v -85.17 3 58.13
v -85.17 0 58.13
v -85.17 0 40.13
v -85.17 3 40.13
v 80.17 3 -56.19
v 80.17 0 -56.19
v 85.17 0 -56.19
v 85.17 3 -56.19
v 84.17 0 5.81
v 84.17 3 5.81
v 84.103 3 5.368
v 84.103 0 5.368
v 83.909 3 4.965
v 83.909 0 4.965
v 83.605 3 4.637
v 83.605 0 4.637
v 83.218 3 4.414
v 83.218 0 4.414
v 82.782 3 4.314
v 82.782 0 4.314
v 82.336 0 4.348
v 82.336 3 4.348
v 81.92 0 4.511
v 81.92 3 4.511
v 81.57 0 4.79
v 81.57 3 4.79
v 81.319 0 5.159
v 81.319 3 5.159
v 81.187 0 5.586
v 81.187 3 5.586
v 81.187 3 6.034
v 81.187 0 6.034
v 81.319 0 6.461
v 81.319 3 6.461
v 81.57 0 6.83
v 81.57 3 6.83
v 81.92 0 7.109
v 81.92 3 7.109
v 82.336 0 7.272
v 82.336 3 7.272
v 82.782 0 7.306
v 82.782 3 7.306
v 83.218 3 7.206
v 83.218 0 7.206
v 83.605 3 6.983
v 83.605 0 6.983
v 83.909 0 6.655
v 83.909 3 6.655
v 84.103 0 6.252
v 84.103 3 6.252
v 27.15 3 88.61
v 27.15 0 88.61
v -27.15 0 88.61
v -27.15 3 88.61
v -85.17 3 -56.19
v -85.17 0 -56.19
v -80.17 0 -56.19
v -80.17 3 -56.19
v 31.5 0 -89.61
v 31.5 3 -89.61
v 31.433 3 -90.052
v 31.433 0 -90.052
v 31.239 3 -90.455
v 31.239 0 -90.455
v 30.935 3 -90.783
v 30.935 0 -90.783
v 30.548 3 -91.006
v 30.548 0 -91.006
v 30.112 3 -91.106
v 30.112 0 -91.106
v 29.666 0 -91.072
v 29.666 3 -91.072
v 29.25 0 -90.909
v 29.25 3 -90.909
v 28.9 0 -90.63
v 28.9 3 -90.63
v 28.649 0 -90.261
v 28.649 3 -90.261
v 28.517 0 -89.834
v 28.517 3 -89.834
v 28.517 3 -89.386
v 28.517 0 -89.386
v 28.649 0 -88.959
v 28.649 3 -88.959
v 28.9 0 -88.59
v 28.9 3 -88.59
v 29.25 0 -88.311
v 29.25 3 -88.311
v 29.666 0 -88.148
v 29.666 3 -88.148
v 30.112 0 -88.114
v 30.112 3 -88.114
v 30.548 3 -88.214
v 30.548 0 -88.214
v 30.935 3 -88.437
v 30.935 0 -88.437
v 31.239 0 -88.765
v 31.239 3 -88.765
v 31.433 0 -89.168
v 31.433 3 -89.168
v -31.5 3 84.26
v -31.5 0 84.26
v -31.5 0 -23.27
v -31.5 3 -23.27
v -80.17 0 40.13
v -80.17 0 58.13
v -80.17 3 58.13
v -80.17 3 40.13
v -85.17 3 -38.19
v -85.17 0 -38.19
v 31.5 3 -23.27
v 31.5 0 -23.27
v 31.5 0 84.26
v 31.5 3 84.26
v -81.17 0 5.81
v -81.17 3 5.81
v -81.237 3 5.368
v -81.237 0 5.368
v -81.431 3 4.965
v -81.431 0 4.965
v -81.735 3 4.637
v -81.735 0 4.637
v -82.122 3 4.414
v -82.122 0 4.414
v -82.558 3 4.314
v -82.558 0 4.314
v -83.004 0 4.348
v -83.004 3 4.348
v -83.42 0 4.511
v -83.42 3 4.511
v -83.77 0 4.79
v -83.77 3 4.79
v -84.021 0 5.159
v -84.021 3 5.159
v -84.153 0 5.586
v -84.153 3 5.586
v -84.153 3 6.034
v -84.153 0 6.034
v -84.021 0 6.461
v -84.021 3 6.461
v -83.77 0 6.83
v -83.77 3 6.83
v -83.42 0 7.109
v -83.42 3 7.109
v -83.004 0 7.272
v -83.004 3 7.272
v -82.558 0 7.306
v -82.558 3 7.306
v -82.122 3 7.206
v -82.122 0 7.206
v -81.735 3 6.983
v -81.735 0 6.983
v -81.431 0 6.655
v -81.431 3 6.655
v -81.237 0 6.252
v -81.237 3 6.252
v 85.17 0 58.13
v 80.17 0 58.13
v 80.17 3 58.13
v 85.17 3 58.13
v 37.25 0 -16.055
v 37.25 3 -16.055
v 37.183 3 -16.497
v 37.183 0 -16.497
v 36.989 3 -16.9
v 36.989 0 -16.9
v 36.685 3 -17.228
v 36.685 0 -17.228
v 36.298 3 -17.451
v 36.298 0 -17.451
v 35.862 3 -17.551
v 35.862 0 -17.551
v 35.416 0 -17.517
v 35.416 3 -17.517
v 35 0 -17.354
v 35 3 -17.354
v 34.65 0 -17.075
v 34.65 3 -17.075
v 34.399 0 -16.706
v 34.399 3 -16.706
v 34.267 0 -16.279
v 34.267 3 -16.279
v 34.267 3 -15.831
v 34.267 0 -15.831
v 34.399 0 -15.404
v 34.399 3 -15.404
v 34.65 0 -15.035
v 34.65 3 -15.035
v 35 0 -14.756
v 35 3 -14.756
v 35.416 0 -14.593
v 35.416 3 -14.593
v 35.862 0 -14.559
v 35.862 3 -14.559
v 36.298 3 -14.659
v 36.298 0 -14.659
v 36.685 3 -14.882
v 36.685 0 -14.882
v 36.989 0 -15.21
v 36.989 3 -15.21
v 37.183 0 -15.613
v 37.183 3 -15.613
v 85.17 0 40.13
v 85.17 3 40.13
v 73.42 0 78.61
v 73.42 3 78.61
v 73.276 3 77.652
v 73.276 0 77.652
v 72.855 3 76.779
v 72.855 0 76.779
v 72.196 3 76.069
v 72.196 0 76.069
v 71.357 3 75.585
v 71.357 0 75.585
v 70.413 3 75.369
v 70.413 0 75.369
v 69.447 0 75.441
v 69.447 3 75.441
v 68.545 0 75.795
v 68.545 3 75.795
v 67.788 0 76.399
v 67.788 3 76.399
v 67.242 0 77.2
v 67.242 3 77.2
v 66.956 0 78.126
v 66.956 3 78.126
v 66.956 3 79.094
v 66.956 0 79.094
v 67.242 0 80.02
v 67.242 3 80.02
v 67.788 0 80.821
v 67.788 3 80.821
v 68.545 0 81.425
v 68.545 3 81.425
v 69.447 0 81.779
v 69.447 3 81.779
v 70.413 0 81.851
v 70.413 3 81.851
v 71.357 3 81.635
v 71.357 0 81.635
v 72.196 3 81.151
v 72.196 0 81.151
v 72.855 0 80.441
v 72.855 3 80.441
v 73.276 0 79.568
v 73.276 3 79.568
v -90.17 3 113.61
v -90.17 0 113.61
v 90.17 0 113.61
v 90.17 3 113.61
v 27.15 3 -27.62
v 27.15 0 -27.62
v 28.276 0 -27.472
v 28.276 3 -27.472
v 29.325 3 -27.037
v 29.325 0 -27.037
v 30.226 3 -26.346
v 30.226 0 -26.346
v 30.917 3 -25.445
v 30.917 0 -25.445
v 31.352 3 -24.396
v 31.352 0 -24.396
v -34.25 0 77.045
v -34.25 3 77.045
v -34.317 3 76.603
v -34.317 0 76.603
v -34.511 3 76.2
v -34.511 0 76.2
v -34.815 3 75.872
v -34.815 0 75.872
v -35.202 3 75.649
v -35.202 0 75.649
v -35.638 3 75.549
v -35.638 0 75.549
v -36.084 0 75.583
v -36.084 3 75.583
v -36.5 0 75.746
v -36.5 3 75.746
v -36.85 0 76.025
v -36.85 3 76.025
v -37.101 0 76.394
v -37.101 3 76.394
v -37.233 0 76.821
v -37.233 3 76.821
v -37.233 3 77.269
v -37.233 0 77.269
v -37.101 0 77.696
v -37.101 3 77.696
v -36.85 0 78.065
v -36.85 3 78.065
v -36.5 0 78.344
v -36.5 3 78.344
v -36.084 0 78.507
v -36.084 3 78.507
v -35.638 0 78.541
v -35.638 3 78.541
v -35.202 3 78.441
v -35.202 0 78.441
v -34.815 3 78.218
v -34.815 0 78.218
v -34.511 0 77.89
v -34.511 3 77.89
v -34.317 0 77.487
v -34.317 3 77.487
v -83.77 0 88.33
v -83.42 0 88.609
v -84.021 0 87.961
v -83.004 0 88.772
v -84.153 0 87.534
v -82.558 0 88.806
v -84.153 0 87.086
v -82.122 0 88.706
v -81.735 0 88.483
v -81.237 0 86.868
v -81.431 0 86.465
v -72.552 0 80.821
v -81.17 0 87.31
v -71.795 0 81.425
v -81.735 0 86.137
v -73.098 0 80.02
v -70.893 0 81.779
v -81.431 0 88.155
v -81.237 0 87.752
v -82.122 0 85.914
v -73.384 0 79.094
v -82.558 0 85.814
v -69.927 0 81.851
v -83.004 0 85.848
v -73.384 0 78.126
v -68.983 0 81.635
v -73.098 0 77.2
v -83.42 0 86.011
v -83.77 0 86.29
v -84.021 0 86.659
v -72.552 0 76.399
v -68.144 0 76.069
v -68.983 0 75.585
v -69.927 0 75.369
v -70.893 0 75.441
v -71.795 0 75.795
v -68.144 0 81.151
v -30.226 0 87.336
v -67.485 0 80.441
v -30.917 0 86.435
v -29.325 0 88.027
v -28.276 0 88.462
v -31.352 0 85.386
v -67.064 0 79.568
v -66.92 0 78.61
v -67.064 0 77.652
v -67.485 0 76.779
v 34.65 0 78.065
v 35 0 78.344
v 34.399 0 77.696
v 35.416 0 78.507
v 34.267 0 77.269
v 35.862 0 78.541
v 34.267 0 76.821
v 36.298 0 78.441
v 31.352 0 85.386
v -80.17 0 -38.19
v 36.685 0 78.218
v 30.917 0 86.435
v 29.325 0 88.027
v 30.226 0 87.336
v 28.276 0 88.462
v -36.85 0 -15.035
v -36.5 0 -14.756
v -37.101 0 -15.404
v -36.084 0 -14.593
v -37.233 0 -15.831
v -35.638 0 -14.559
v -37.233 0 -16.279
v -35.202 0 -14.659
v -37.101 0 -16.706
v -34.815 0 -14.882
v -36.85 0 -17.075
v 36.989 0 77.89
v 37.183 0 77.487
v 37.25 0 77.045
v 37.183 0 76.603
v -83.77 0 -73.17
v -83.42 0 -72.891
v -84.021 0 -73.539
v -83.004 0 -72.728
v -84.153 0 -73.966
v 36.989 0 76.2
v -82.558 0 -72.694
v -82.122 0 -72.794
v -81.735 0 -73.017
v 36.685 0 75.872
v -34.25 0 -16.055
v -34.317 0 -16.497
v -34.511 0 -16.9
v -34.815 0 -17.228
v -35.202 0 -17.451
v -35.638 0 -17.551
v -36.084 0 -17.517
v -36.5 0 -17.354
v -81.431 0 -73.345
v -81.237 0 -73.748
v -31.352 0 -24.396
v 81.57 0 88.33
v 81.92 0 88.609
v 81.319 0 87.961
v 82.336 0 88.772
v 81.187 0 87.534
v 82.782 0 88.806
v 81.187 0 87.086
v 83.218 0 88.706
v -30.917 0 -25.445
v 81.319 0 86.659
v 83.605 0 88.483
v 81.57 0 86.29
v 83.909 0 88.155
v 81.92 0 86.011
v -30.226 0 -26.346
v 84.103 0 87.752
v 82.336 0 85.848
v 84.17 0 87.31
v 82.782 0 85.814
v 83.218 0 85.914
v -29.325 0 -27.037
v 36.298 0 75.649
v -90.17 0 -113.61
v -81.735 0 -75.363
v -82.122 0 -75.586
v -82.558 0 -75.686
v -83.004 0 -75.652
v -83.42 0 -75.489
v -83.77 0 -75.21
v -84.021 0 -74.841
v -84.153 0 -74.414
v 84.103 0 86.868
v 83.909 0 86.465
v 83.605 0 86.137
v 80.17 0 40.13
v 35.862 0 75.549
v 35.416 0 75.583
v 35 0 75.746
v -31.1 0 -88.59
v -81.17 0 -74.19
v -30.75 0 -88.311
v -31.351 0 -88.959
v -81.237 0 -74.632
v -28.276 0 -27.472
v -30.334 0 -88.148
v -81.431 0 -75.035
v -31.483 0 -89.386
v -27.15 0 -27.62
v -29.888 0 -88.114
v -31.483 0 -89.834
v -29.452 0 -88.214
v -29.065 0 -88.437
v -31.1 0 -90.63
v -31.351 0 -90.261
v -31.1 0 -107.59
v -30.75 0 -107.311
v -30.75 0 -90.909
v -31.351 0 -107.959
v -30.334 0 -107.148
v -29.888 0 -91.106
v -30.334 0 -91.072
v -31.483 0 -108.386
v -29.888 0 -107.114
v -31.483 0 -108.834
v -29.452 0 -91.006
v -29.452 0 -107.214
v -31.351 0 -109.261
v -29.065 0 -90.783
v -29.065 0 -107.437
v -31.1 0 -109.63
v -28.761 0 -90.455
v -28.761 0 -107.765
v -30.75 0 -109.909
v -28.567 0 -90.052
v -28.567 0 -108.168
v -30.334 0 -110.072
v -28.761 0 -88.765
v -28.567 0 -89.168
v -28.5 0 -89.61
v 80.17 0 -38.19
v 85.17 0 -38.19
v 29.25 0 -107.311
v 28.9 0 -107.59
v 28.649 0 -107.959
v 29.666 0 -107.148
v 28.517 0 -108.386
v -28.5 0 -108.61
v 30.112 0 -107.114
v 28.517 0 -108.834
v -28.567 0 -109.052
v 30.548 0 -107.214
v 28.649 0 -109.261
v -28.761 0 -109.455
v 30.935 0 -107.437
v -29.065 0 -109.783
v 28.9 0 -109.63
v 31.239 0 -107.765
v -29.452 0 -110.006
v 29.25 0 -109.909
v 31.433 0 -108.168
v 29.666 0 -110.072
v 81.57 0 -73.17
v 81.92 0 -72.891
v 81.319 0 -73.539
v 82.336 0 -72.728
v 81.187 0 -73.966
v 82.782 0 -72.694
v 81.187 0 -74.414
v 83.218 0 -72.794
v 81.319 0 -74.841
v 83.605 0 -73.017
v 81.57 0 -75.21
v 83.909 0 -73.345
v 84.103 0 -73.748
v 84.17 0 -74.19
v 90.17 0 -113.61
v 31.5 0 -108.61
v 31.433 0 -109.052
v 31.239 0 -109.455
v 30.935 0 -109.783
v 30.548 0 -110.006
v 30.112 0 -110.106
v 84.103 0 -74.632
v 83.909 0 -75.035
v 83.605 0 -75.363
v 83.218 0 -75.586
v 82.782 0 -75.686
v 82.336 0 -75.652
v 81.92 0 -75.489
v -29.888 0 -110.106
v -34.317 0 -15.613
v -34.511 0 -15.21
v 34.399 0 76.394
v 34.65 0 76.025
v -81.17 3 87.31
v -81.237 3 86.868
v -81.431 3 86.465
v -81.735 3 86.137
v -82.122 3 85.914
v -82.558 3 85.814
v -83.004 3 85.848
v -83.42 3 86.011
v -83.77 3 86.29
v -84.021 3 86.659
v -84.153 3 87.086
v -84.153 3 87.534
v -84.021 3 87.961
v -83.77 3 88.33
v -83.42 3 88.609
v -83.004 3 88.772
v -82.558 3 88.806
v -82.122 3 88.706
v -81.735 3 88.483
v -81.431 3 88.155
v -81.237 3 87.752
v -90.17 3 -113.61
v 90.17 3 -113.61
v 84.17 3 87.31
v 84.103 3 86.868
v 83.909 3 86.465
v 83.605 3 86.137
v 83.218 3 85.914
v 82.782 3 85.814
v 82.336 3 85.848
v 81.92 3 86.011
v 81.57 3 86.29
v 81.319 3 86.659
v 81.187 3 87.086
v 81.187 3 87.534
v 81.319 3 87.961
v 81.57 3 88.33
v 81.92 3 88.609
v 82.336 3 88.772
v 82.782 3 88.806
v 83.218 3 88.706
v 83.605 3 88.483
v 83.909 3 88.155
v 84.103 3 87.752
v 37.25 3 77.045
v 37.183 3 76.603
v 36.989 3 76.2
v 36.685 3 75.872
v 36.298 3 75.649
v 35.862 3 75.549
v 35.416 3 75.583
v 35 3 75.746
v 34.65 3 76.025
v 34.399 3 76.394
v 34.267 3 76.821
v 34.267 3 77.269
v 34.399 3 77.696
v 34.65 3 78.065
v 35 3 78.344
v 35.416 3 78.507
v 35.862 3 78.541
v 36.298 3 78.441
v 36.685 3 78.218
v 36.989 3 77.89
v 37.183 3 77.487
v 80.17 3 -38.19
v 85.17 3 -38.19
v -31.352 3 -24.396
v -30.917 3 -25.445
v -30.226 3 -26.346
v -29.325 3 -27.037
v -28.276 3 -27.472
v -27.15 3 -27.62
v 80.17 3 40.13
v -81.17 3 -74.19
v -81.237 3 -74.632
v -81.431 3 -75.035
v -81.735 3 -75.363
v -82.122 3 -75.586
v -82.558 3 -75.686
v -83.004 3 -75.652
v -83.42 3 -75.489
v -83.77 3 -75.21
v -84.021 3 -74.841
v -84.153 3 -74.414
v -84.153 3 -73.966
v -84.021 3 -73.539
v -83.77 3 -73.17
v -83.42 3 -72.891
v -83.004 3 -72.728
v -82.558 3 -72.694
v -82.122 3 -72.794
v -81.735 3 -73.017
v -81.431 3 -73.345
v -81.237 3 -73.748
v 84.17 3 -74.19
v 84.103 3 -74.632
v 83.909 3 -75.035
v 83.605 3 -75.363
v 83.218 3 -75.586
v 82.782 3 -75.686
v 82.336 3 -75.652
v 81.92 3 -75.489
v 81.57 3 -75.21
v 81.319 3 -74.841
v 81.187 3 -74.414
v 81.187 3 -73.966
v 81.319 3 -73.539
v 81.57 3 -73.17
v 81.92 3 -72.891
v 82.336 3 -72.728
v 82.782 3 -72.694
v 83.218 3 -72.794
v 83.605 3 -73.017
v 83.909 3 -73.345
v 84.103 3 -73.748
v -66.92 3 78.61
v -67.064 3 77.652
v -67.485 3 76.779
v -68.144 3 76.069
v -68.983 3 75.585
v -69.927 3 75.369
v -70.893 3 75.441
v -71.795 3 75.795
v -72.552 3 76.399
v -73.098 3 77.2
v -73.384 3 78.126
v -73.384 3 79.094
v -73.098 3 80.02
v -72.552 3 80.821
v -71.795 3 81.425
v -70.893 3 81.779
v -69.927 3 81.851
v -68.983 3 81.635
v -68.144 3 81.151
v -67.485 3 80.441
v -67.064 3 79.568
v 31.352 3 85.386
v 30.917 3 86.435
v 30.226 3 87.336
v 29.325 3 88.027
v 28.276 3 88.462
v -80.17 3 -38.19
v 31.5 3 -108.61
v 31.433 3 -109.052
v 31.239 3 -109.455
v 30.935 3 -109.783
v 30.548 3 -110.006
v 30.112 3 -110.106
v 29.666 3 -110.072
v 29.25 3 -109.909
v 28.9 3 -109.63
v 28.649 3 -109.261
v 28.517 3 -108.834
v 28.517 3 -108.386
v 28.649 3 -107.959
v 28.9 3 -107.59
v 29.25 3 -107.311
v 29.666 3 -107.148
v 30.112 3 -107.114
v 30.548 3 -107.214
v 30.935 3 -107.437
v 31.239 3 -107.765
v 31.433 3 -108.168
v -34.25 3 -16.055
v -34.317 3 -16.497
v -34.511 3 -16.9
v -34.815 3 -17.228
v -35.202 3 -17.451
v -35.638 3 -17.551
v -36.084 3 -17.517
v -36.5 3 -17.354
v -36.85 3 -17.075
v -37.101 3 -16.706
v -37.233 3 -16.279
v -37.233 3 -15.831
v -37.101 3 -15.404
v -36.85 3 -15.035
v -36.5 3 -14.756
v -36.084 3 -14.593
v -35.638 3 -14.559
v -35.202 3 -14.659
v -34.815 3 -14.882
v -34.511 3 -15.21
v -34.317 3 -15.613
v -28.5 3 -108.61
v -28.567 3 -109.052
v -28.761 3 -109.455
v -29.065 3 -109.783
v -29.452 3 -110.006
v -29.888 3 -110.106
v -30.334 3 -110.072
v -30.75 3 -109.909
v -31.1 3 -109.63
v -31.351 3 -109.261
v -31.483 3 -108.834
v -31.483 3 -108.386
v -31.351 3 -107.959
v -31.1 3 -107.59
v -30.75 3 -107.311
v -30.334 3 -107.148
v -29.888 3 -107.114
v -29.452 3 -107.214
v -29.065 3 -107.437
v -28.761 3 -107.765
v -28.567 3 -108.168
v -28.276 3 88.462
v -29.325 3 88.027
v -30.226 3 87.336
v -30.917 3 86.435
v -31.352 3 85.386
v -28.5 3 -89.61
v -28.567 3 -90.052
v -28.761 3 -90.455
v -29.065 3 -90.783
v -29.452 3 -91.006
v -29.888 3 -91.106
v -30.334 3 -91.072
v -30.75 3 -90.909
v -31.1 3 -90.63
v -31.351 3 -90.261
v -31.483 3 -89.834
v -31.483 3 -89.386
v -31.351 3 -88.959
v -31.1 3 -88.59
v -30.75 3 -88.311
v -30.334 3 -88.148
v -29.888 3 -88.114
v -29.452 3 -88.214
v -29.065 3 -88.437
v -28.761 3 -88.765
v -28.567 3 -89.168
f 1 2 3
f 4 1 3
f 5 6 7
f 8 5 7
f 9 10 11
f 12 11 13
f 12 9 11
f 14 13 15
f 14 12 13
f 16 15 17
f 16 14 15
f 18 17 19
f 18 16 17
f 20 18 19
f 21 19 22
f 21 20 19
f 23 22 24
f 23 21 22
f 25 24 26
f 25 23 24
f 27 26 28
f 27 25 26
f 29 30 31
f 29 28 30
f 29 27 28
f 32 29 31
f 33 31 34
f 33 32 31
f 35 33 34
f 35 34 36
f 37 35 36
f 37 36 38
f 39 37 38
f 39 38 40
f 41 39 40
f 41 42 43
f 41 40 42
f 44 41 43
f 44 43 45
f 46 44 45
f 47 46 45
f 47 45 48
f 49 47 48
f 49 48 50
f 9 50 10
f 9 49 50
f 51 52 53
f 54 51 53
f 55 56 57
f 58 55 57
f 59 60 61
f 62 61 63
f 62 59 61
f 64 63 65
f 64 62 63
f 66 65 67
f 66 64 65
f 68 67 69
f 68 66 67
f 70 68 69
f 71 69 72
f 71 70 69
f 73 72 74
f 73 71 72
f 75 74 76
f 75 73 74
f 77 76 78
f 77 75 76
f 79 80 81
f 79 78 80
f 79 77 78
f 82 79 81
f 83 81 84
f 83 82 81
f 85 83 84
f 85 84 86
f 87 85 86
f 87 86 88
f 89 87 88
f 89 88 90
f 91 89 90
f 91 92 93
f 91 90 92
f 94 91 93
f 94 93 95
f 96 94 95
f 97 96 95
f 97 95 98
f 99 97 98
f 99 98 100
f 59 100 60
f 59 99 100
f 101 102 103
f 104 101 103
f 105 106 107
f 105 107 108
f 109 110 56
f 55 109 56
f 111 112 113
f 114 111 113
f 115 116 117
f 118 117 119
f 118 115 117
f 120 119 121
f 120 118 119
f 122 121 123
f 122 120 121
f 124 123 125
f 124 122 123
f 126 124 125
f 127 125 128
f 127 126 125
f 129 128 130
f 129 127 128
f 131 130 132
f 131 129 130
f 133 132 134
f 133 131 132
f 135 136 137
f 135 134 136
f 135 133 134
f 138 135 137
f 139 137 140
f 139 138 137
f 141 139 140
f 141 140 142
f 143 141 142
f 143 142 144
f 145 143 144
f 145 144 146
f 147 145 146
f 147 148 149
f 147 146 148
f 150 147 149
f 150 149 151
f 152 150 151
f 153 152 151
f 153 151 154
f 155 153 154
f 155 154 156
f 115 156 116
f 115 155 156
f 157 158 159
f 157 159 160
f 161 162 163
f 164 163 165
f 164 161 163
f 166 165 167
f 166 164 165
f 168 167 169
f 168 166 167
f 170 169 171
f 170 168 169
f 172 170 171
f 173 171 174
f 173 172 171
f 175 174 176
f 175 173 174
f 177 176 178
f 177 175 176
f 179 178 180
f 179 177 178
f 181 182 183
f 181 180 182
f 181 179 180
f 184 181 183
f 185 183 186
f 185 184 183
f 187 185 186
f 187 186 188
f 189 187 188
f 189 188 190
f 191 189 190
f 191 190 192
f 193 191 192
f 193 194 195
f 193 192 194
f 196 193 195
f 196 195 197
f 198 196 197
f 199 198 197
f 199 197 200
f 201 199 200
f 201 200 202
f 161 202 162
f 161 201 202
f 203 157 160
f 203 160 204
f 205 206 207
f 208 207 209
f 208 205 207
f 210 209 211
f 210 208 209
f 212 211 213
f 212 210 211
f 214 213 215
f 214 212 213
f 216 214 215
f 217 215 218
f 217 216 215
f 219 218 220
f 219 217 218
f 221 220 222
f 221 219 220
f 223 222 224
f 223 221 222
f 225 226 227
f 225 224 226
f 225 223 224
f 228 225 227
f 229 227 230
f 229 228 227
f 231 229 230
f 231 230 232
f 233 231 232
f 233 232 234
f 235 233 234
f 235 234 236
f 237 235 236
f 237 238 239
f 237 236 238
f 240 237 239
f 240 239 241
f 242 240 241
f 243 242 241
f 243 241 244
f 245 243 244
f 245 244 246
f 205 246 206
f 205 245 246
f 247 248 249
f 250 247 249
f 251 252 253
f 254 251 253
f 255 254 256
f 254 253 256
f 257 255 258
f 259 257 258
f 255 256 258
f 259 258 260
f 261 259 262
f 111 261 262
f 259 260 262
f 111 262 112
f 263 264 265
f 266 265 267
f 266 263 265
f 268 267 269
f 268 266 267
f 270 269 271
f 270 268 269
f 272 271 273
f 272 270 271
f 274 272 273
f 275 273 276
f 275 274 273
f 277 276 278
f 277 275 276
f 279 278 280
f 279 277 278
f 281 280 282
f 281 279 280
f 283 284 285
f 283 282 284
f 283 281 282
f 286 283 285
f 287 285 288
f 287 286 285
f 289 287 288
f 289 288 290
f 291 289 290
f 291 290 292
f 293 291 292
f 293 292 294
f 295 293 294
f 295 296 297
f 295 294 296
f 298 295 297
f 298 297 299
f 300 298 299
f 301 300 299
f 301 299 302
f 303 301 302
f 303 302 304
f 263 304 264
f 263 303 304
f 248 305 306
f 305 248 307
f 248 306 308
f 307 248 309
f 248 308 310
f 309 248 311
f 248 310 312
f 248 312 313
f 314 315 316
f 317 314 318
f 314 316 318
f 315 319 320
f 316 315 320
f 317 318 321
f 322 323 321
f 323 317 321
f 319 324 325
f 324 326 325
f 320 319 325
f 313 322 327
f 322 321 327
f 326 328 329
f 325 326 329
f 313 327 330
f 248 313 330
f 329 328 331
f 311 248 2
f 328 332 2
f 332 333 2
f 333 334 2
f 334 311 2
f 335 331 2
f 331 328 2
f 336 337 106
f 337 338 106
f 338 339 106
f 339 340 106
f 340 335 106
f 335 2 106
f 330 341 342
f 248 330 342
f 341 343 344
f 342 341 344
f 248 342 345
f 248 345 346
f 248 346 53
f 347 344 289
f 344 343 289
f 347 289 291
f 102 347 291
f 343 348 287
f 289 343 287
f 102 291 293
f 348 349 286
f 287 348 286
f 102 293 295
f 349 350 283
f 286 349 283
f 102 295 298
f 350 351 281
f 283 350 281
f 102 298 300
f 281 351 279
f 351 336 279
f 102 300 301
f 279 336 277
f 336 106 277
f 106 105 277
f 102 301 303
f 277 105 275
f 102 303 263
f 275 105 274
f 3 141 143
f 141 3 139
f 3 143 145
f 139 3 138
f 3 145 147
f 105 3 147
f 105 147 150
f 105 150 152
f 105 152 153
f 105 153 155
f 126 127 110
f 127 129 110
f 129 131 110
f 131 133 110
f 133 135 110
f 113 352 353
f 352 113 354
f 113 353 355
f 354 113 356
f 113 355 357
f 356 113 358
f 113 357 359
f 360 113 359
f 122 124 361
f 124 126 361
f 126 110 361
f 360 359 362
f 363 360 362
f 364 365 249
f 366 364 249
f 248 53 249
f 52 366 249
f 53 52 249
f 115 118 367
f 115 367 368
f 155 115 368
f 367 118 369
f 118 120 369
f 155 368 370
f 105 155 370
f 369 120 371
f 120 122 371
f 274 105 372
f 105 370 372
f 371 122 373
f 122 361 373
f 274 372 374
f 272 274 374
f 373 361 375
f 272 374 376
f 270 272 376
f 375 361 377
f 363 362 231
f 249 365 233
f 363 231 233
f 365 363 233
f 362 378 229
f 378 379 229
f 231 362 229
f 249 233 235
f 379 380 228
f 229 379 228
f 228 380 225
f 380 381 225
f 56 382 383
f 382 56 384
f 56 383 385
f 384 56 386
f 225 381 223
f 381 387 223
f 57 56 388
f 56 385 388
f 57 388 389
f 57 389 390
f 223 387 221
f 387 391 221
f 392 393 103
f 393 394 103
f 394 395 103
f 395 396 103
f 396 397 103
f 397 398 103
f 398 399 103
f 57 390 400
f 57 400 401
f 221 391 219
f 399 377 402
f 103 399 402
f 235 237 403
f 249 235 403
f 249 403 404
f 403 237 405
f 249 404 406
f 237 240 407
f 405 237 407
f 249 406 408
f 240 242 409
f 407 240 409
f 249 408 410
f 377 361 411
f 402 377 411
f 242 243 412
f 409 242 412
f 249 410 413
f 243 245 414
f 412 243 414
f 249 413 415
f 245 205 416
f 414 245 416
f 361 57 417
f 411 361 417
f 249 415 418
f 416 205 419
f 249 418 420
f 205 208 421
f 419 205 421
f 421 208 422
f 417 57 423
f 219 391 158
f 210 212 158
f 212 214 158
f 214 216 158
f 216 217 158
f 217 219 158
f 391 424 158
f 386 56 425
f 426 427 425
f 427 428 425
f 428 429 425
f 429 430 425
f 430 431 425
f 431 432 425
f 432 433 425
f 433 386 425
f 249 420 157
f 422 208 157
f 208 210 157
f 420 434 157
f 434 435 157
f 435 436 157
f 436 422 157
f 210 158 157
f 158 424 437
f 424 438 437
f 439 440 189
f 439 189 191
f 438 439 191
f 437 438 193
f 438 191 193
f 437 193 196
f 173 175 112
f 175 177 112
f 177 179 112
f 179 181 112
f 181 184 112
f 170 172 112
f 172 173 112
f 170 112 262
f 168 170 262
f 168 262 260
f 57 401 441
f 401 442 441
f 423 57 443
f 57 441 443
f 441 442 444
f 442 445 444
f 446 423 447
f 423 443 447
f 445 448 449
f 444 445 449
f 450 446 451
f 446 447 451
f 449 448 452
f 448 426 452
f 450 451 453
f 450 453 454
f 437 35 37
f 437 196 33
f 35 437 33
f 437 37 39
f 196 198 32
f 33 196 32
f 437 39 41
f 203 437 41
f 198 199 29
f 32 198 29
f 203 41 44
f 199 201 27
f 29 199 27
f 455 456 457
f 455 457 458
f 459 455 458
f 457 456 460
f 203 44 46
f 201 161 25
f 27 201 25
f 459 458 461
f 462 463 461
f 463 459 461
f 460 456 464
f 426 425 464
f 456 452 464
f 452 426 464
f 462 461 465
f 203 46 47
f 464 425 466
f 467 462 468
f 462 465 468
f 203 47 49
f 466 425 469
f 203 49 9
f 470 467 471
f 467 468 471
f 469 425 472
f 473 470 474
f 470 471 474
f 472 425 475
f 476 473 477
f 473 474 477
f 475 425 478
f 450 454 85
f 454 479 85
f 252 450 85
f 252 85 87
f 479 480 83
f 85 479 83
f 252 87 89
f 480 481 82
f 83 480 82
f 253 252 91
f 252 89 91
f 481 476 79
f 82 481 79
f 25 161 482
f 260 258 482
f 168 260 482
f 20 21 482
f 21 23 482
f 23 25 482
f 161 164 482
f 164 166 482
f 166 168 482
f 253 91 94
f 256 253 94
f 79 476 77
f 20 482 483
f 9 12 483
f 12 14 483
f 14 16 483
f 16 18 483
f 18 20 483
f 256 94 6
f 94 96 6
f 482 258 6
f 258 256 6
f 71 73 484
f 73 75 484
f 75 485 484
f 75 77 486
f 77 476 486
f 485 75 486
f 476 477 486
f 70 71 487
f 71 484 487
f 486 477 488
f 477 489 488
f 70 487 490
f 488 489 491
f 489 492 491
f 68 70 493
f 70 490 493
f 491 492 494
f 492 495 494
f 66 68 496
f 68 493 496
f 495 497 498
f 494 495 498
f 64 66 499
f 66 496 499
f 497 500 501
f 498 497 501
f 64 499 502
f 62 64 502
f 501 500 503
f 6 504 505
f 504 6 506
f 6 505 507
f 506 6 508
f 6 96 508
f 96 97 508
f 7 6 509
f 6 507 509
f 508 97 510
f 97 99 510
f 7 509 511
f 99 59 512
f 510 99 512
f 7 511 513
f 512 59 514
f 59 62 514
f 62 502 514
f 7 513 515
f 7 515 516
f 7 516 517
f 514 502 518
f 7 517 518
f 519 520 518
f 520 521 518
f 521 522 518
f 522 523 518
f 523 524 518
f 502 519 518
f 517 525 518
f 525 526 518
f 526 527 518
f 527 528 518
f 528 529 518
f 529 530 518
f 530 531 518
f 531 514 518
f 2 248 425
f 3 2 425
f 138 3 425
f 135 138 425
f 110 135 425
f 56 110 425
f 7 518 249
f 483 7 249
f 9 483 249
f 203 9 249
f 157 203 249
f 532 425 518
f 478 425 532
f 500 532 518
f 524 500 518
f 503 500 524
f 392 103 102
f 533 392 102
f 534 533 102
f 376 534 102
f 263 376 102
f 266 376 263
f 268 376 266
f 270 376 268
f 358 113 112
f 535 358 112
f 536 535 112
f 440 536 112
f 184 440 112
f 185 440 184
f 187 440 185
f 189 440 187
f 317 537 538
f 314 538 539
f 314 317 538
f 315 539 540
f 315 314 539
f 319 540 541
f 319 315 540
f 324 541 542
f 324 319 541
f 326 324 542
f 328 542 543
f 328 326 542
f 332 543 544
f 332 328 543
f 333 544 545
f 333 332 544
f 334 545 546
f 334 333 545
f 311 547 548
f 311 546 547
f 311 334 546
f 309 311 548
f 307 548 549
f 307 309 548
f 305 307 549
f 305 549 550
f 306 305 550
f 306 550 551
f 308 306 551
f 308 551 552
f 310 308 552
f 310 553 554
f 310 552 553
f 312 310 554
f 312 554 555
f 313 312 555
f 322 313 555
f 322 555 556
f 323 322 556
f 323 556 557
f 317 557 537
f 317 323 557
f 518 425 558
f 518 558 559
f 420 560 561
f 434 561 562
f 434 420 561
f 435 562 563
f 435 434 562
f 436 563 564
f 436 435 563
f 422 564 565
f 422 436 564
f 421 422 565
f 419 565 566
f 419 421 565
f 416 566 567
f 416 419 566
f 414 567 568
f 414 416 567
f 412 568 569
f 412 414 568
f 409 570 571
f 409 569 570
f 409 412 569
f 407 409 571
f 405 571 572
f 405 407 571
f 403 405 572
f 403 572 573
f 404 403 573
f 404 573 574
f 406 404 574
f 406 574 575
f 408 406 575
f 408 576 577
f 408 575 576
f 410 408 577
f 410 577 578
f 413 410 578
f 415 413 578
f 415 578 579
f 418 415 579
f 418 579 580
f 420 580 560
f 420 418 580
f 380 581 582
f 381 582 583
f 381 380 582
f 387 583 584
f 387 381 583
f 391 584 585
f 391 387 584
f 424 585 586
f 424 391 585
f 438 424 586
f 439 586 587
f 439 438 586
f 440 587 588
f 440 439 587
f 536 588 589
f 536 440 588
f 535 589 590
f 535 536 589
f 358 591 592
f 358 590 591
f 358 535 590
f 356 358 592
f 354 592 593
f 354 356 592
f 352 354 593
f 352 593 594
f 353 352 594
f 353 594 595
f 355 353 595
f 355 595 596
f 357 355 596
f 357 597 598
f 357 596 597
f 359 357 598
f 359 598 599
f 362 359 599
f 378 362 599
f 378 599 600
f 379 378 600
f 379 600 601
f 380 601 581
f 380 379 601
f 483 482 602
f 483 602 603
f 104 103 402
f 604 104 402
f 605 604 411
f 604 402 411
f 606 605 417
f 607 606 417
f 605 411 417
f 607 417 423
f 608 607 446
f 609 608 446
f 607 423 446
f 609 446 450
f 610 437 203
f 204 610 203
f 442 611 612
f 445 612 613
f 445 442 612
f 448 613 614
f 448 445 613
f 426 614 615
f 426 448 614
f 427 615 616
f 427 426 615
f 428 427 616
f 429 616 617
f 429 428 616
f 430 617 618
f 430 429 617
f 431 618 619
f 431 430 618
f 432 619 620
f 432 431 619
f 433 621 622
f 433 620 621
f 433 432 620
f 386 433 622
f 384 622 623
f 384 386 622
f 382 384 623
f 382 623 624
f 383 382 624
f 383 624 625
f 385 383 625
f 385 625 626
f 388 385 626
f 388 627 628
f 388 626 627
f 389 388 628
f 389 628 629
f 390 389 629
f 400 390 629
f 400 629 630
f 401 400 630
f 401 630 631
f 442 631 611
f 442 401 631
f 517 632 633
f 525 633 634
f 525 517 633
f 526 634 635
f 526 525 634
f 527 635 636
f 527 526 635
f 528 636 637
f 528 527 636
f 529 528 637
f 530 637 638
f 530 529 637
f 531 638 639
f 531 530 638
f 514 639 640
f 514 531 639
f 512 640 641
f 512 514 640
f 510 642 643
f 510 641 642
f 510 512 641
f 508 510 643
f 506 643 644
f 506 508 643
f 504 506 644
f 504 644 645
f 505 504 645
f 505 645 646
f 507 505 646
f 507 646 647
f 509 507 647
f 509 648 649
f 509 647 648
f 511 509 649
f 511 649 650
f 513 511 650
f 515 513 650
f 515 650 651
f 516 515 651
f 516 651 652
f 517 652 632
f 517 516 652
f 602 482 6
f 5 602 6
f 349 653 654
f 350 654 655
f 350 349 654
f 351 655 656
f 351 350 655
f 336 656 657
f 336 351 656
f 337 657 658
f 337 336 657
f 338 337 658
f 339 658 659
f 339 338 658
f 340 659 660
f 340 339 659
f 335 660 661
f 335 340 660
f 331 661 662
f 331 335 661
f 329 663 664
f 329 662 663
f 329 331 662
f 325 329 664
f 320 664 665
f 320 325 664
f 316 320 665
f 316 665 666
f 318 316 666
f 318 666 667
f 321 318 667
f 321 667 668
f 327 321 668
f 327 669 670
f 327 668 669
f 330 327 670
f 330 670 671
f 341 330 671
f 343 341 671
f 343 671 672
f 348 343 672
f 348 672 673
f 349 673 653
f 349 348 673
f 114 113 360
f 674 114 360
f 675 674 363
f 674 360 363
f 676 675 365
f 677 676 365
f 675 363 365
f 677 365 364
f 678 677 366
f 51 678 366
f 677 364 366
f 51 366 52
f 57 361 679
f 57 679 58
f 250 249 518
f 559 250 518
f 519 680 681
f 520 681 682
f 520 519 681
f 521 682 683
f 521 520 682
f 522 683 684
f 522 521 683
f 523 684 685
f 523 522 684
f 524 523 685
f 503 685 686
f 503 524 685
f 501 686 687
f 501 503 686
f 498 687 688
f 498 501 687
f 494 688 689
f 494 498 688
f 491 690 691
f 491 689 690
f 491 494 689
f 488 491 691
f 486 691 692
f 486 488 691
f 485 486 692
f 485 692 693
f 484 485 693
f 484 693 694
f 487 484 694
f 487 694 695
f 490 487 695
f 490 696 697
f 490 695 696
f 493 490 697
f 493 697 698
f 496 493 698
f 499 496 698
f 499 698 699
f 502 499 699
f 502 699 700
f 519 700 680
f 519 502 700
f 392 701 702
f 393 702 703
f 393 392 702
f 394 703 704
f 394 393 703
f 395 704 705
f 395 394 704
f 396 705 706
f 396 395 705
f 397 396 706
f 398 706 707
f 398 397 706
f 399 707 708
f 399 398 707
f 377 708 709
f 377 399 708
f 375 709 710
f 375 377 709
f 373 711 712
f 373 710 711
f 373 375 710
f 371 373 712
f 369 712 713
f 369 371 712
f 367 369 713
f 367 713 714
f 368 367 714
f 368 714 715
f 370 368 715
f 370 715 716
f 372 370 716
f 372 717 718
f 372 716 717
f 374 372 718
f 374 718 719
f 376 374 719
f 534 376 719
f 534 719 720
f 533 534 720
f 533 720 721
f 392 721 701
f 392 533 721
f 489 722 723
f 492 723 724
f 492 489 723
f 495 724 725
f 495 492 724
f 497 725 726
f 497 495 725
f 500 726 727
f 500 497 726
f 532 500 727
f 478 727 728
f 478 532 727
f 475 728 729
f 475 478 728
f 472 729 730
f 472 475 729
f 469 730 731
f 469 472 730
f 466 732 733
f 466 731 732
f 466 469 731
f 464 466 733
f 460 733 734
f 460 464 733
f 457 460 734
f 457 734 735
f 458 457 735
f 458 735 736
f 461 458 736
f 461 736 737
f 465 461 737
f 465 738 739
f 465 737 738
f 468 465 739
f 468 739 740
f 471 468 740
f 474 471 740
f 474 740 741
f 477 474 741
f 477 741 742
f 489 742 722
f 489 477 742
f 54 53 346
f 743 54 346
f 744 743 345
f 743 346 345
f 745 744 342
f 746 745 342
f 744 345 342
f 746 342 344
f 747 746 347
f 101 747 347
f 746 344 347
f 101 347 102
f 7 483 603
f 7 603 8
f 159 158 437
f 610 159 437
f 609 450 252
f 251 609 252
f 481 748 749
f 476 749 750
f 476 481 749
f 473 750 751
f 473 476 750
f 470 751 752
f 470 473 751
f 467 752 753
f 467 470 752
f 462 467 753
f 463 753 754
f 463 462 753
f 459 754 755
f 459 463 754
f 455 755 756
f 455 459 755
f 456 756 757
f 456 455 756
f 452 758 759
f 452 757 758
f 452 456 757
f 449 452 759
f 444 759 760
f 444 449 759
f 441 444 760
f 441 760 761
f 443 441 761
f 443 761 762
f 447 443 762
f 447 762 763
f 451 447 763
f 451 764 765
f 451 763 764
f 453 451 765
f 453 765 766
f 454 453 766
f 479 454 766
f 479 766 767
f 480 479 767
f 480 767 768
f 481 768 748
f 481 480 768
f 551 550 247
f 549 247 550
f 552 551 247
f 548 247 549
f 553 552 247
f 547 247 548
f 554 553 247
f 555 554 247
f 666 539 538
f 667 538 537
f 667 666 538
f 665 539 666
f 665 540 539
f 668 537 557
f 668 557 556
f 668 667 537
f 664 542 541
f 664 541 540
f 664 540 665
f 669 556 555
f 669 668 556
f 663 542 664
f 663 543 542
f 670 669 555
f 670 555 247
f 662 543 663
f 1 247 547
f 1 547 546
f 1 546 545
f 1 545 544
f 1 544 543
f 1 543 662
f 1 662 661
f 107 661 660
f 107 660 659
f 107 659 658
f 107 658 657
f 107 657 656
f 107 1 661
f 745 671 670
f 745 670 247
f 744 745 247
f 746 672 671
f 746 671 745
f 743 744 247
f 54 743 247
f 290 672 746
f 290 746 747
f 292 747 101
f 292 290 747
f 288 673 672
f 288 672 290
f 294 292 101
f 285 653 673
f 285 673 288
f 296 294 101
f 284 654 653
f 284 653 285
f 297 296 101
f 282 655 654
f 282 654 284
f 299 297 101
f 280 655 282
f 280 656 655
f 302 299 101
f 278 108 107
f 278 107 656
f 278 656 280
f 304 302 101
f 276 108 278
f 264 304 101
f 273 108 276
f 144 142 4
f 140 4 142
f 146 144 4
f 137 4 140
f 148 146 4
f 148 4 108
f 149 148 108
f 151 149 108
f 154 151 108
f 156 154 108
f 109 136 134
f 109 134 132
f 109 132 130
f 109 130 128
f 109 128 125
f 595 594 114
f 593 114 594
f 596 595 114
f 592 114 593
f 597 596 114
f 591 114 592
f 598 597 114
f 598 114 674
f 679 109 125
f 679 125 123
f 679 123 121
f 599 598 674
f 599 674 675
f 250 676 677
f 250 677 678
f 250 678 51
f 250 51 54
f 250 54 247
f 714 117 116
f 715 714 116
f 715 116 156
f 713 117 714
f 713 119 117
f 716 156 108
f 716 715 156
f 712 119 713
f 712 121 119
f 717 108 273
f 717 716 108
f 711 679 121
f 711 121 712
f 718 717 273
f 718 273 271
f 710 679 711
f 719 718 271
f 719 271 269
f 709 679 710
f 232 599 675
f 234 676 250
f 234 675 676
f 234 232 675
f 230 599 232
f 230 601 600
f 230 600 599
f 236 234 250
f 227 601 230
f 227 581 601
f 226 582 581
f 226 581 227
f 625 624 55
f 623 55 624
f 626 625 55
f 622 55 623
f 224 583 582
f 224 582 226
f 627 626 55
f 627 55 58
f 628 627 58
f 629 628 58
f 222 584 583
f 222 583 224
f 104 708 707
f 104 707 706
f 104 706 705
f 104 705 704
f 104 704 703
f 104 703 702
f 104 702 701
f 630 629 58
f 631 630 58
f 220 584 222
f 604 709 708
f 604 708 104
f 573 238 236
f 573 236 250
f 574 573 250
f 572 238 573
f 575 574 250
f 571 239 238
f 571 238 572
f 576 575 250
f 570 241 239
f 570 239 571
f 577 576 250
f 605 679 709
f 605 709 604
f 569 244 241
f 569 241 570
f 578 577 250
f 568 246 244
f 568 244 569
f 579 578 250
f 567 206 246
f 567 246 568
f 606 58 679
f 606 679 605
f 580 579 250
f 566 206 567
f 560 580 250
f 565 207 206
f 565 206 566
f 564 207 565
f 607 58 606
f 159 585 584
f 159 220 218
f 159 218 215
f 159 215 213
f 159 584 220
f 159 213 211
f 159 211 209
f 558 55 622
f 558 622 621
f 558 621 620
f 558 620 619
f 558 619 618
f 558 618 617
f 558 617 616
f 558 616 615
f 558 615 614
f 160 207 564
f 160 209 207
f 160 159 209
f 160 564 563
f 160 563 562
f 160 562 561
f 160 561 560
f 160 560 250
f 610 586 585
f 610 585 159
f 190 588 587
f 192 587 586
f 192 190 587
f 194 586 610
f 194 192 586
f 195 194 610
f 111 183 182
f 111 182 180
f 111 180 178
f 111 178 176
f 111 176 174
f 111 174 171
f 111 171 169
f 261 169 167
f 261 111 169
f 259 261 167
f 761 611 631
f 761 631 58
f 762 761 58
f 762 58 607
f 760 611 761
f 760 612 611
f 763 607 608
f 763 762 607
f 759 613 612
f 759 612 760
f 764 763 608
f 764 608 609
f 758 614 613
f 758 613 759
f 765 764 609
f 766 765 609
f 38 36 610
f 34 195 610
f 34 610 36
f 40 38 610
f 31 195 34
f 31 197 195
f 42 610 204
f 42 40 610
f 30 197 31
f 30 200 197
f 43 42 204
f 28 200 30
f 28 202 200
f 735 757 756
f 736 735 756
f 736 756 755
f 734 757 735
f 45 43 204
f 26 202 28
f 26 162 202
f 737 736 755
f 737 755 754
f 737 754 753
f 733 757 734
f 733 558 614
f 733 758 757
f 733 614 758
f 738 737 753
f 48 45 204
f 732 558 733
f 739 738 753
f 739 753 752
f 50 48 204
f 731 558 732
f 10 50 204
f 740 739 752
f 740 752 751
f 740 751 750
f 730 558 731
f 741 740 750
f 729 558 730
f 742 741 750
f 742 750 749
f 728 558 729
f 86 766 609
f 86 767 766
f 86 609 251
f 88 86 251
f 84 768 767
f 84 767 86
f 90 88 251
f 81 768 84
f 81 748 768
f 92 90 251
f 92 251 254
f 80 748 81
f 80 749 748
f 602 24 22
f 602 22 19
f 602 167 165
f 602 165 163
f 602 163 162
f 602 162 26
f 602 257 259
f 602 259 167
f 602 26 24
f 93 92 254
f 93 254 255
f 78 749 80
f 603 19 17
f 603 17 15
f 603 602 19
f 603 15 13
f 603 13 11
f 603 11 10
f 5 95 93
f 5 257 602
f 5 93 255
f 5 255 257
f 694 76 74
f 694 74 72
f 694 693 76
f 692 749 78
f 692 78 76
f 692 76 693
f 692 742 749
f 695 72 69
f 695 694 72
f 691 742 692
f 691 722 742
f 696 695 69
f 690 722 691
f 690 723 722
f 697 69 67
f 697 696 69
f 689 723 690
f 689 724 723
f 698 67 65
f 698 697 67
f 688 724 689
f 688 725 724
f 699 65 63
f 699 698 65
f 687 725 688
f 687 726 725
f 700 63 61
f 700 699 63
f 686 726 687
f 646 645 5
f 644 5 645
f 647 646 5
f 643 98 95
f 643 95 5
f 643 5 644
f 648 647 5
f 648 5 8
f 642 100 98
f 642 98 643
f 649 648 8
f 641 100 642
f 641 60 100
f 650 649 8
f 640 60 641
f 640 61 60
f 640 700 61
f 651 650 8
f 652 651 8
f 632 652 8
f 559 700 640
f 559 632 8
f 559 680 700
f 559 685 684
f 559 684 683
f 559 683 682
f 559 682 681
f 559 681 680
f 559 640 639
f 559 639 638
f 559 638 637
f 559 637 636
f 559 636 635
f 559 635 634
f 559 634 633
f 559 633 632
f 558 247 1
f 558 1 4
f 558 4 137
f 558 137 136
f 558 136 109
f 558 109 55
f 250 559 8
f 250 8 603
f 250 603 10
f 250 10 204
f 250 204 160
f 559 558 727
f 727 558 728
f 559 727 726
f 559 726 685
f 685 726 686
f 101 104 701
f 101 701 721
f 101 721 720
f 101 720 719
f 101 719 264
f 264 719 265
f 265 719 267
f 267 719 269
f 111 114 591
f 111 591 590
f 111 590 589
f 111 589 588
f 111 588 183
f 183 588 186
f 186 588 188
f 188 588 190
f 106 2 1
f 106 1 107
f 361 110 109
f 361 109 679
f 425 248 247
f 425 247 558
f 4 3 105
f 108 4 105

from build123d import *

# Parameters (mm, degrees)
SCHIZZO1_W                   = 180.34
SCHIZZO1_H                   = 227.22
ESTRUSIONE_ESTRUSIONE1_DEPTH = 3
SCHIZZO2_R                   = 1.5
SCHIZZO2_R_2                 = 3.25
SCHIZZO2_W                   = 5
SCHIZZO2_H                   = 18
TAGLIO_ESTRUSIONE1_DEPTH     = 4
SCHIZZO3_R                   = 1.5
TAGLIO_ESTRUSIONE5_DEPTH     = 4


with BuildPart() as part:
    # Schizzo1 → Estrusione-Estrusione1 (new body)
    with BuildSketch(Plane(origin=(0, 0, 0), x_dir=(1, 0, 0), z_dir=(0, 1, 0))):
        Rectangle(SCHIZZO1_W, SCHIZZO1_H)
    extrude(amount=ESTRUSIONE_ESTRUSIONE1_DEPTH)

    # Schizzo2 → Taglio-Estrusione1 (cut, through all)
    with BuildSketch(Plane(origin=(0, 0, 0), x_dir=(1, 0, 0), z_dir=(0, 1, 0))):
        with Locations((-82.67, -5.81)):
            Circle(SCHIZZO2_R)
        with Locations((-82.67, -87.31)):
            Circle(SCHIZZO2_R)
        with Locations((-82.67, 74.19)):
            Circle(SCHIZZO2_R)
        with Locations((82.67, -87.31)):
            Circle(SCHIZZO2_R)
        with Locations((82.67, -5.81)):
            Circle(SCHIZZO2_R)
        with Locations((82.67, 74.19)):
            Circle(SCHIZZO2_R)
        with Locations((-70.17, -78.61)):
            Circle(SCHIZZO2_R_2)
        with Locations((70.17, -78.61)):
            Circle(SCHIZZO2_R_2)
        with Locations((-30, 89.61)):
            Circle(SCHIZZO2_R)
        with Locations((-30, 108.61)):
            Circle(SCHIZZO2_R)
        with Locations((30, 89.61)):
            Circle(SCHIZZO2_R)
        with Locations((30, 108.61)):
            Circle(SCHIZZO2_R)
        with Locations((82.67, -49.13)):
            Rectangle(SCHIZZO2_W, SCHIZZO2_H)
        with Locations((-82.67, -49.13)):
            Rectangle(SCHIZZO2_W, SCHIZZO2_H)
        with Locations((-82.67, 47.19)):
            Rectangle(SCHIZZO2_W, SCHIZZO2_H)
        with Locations((82.67, 47.19)):
            Rectangle(SCHIZZO2_W, SCHIZZO2_H)
    extrude(amount=TAGLIO_ESTRUSIONE1_DEPTH, mode=Mode.SUBTRACT)

    # Schizzo3 → Taglio-Estrusione5 (cut, through all)
    with BuildSketch(Plane(origin=(0, 0, 0), x_dir=(1, 0, 0), z_dir=(0, 1, 0))):
        with Locations((-35.75, -77.045)):
            Circle(SCHIZZO3_R)
        with Locations((35.75, -77.045)):
            Circle(SCHIZZO3_R)
        with Locations((-35.75, 16.055)):
            Circle(SCHIZZO3_R)
        with Locations((35.75, 16.055)):
            Circle(SCHIZZO3_R)
        with BuildLine():
            Line((-31.5, -84.26), (-31.5, 23.27))
            ThreePointArc((-31.5, 23.27), (-30.225914498, 26.345914498), (-27.15, 27.62))
            Line((-27.15, 27.62), (27.15, 27.62))
            ThreePointArc((27.15, 27.62), (30.225914498, 26.345914498), (31.5, 23.27))
            Line((31.5, 23.27), (31.5, -84.26))
            ThreePointArc((31.5, -84.26), (30.225914498, -87.335914498), (27.15, -88.61))
            Line((27.15, -88.61), (-27.15, -88.61))
            ThreePointArc((-27.15, -88.61), (-30.225914498, -87.335914498), (-31.5, -84.26))
        make_face()
    extrude(amount=TAGLIO_ESTRUSIONE5_DEPTH, mode=Mode.SUBTRACT)


solid = part.part
